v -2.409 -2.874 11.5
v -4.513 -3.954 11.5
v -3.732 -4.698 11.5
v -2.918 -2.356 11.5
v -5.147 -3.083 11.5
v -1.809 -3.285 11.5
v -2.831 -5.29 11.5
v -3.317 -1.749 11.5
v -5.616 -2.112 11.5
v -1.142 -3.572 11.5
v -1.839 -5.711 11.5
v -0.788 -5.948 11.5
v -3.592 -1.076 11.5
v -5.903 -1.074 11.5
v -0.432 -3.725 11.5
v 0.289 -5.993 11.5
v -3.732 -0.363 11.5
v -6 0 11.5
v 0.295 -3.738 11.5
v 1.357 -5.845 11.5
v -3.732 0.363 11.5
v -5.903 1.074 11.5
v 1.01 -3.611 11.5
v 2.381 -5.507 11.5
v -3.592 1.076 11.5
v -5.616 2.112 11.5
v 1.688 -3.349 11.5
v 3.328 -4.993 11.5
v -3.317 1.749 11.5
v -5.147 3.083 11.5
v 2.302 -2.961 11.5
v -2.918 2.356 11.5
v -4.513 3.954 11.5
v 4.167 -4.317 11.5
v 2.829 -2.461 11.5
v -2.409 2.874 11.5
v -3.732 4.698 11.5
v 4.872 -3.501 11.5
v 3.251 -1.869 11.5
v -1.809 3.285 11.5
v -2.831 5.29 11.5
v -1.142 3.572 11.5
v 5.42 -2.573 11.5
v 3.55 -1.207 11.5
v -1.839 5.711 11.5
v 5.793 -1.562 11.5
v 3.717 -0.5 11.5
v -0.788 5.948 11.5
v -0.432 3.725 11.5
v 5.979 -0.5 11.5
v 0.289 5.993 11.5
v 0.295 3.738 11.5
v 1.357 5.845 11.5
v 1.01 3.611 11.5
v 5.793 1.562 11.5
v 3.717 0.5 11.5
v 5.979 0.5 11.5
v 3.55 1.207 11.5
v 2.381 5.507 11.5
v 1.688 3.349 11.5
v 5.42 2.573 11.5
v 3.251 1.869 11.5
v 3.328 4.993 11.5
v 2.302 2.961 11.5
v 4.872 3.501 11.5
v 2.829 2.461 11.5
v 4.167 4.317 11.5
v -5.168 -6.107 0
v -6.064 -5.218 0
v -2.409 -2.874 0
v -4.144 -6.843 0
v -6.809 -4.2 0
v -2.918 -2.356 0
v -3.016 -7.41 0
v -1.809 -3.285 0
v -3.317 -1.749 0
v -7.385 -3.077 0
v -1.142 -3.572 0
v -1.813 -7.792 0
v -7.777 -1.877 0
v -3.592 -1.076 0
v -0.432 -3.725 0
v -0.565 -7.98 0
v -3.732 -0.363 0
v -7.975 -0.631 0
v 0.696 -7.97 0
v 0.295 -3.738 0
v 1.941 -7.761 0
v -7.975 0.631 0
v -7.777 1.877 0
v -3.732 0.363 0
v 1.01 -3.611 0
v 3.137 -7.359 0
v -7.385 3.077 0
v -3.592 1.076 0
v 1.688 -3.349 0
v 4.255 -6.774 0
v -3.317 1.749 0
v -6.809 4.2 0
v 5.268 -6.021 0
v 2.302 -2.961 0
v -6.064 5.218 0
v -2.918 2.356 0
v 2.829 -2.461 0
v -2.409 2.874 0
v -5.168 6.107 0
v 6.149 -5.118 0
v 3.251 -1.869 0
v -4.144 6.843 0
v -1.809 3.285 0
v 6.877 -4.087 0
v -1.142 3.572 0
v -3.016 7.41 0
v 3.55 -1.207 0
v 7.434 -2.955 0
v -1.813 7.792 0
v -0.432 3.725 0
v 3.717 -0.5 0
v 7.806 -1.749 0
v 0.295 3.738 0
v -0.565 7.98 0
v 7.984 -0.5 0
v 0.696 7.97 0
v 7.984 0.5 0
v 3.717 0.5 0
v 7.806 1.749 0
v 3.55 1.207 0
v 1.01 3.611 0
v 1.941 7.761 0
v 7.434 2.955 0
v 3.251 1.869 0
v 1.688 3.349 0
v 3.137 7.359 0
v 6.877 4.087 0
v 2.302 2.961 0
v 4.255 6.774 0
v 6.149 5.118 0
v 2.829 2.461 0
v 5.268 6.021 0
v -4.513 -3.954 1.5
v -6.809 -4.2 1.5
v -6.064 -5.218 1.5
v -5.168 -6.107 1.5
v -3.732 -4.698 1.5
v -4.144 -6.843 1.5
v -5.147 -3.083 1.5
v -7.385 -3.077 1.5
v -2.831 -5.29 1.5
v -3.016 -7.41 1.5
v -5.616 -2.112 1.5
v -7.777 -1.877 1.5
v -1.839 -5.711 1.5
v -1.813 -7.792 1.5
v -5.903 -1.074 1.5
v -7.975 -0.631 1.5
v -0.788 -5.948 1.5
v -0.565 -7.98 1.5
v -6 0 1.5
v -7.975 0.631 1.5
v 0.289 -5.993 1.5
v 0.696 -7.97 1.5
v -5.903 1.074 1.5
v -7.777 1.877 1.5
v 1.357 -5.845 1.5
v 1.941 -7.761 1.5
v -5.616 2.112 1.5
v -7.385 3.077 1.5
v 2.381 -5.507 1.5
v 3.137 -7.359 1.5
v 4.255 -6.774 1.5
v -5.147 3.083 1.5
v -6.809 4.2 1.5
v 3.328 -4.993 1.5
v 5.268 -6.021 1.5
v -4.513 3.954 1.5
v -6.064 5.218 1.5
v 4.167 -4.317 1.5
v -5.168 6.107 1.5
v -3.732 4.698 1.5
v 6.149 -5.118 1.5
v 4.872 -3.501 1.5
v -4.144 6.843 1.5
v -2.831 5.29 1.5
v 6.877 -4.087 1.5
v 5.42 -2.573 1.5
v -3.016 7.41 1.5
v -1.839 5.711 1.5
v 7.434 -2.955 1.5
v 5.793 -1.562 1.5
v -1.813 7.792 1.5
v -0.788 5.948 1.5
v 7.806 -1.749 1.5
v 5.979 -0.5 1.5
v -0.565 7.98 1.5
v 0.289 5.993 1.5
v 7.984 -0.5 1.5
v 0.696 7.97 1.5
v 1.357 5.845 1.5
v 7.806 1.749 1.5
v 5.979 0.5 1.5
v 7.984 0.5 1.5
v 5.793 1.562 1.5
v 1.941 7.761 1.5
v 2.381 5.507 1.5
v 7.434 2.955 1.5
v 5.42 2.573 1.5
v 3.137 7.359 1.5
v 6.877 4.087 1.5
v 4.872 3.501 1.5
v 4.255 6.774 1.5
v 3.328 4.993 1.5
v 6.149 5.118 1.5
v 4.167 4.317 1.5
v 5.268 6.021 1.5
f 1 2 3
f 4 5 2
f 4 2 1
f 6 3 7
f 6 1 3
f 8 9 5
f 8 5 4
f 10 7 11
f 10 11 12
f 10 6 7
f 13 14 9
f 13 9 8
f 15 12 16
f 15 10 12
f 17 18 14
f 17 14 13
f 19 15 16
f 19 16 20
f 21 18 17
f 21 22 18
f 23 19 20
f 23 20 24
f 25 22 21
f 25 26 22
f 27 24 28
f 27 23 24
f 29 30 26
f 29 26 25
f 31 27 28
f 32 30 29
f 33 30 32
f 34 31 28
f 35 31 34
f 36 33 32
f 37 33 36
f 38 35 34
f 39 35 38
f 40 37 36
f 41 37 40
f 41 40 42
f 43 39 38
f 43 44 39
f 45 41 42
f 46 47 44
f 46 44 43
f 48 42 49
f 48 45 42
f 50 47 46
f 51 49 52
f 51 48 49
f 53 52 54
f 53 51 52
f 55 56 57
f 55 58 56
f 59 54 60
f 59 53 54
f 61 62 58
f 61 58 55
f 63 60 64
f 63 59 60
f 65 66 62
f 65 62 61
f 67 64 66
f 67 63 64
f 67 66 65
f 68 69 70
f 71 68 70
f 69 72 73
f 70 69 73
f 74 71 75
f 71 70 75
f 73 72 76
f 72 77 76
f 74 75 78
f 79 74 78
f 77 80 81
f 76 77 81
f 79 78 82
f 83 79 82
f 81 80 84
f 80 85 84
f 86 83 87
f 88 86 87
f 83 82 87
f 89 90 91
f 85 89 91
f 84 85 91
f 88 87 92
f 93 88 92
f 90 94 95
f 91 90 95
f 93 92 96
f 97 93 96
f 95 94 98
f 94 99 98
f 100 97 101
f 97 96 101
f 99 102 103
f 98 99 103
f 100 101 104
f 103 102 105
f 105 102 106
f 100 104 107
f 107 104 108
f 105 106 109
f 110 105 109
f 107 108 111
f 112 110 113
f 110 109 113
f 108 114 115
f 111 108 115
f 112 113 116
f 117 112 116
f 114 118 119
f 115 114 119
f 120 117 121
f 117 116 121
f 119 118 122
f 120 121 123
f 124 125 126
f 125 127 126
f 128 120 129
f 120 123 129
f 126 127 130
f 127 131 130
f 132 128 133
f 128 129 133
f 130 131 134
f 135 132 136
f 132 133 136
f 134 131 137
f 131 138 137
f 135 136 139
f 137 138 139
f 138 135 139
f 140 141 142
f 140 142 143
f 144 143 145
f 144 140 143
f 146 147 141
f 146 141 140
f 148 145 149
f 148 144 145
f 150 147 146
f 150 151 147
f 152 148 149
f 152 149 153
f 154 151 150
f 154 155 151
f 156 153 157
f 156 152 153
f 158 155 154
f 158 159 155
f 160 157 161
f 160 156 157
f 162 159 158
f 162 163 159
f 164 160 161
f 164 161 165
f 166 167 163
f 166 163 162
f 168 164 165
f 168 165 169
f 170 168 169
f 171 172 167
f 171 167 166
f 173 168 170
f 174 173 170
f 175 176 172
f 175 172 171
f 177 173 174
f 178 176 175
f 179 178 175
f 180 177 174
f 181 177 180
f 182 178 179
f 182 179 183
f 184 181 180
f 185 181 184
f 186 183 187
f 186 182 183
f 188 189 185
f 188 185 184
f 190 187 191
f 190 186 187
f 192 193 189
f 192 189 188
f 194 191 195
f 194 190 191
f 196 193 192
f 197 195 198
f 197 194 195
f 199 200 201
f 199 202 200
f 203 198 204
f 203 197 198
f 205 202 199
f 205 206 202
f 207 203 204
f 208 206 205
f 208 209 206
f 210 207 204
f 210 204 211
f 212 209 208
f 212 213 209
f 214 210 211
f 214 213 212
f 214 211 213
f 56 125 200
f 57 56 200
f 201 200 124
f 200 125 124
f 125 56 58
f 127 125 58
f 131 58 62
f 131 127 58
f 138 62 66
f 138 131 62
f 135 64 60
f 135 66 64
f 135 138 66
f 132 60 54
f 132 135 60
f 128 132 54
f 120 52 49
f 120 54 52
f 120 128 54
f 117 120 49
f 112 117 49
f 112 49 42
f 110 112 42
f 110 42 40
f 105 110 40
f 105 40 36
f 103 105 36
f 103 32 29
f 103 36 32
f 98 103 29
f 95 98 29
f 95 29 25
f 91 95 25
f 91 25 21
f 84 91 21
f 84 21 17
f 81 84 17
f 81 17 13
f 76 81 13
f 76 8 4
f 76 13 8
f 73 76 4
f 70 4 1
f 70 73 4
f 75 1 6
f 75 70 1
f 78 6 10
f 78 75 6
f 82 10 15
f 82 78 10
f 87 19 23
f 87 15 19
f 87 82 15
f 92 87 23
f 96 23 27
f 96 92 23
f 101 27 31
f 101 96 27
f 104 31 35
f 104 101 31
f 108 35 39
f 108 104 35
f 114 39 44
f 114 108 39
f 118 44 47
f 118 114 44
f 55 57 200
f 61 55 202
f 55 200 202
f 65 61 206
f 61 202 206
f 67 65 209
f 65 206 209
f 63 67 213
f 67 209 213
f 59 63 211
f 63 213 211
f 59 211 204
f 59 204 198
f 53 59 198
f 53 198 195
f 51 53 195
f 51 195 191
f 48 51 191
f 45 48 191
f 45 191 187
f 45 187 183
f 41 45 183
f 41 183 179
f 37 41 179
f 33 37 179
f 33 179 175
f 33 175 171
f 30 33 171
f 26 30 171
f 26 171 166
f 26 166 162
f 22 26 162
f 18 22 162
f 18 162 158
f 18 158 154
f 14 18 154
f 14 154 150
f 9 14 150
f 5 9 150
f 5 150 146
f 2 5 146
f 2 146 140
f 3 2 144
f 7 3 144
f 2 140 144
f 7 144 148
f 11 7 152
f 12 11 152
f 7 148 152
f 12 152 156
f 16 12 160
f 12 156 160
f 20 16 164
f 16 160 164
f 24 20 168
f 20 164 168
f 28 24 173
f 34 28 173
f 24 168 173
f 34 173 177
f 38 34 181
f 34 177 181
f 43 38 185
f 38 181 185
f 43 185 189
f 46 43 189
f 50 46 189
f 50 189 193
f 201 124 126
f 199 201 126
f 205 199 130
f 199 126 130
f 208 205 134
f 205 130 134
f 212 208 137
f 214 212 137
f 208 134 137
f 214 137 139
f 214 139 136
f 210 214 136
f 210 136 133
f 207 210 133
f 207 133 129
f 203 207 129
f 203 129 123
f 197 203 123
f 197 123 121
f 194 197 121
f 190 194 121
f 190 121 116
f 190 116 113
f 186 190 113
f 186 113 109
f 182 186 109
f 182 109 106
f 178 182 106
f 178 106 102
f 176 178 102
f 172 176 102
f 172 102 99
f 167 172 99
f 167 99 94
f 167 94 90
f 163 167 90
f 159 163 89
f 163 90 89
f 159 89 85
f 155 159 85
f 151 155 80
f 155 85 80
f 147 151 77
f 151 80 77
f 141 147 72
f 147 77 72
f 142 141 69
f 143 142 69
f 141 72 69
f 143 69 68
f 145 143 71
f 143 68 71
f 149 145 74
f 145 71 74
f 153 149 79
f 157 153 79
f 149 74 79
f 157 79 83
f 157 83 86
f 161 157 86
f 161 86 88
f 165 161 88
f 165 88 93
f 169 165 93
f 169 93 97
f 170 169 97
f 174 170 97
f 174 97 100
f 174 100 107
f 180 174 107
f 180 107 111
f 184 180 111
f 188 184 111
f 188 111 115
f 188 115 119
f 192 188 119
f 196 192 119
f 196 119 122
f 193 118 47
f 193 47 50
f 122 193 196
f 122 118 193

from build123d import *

# Parameters (mm, degrees)
BOX_W             = 10
BOX_H             = 1
BOX_DEPTH         = 14
CYLINDER002_R     = 3.75
CYLINDER002_DEPTH = 14
CYLINDER001_R     = 8
CYLINDER001_DEPTH = 1.5
CYLINDER_R        = 6
CYLINDER_DEPTH    = 11.5


with BuildPart() as opening:
    # Box → Box (new body)
    with BuildSketch(Plane(origin=(0, -0.5, -1), x_dir=(1, 0, 0), z_dir=(0, 0, 1))):
        with Locations((5, 0.5)):
            Rectangle(BOX_W, BOX_H)
    extrude(amount=BOX_DEPTH)


with BuildPart() as inner:
    # Cylinder002 → Cylinder002 (new body)
    with BuildSketch(Plane.XY.offset(-1)):
        Circle(CYLINDER002_R)
    extrude(amount=CYLINDER002_DEPTH)


with BuildPart() as base:
    # Cylinder001 → Cylinder001 (new body)
    with BuildSketch(Plane.XY):
        Circle(CYLINDER001_R)
    extrude(amount=CYLINDER001_DEPTH)


with BuildPart() as gap:
    # Cylinder → Cylinder (new body)
    with BuildSketch(Plane.XY):
        Circle(CYLINDER_R)
    extrude(amount=CYLINDER_DEPTH)

    # Fusion: union base
    add(base.part)

    # Cut: cut inner
    add(inner.part, mode=Mode.SUBTRACT)

    # Cut001: cut opening
    add(opening.part, mode=Mode.SUBTRACT)


solid = gap.part
